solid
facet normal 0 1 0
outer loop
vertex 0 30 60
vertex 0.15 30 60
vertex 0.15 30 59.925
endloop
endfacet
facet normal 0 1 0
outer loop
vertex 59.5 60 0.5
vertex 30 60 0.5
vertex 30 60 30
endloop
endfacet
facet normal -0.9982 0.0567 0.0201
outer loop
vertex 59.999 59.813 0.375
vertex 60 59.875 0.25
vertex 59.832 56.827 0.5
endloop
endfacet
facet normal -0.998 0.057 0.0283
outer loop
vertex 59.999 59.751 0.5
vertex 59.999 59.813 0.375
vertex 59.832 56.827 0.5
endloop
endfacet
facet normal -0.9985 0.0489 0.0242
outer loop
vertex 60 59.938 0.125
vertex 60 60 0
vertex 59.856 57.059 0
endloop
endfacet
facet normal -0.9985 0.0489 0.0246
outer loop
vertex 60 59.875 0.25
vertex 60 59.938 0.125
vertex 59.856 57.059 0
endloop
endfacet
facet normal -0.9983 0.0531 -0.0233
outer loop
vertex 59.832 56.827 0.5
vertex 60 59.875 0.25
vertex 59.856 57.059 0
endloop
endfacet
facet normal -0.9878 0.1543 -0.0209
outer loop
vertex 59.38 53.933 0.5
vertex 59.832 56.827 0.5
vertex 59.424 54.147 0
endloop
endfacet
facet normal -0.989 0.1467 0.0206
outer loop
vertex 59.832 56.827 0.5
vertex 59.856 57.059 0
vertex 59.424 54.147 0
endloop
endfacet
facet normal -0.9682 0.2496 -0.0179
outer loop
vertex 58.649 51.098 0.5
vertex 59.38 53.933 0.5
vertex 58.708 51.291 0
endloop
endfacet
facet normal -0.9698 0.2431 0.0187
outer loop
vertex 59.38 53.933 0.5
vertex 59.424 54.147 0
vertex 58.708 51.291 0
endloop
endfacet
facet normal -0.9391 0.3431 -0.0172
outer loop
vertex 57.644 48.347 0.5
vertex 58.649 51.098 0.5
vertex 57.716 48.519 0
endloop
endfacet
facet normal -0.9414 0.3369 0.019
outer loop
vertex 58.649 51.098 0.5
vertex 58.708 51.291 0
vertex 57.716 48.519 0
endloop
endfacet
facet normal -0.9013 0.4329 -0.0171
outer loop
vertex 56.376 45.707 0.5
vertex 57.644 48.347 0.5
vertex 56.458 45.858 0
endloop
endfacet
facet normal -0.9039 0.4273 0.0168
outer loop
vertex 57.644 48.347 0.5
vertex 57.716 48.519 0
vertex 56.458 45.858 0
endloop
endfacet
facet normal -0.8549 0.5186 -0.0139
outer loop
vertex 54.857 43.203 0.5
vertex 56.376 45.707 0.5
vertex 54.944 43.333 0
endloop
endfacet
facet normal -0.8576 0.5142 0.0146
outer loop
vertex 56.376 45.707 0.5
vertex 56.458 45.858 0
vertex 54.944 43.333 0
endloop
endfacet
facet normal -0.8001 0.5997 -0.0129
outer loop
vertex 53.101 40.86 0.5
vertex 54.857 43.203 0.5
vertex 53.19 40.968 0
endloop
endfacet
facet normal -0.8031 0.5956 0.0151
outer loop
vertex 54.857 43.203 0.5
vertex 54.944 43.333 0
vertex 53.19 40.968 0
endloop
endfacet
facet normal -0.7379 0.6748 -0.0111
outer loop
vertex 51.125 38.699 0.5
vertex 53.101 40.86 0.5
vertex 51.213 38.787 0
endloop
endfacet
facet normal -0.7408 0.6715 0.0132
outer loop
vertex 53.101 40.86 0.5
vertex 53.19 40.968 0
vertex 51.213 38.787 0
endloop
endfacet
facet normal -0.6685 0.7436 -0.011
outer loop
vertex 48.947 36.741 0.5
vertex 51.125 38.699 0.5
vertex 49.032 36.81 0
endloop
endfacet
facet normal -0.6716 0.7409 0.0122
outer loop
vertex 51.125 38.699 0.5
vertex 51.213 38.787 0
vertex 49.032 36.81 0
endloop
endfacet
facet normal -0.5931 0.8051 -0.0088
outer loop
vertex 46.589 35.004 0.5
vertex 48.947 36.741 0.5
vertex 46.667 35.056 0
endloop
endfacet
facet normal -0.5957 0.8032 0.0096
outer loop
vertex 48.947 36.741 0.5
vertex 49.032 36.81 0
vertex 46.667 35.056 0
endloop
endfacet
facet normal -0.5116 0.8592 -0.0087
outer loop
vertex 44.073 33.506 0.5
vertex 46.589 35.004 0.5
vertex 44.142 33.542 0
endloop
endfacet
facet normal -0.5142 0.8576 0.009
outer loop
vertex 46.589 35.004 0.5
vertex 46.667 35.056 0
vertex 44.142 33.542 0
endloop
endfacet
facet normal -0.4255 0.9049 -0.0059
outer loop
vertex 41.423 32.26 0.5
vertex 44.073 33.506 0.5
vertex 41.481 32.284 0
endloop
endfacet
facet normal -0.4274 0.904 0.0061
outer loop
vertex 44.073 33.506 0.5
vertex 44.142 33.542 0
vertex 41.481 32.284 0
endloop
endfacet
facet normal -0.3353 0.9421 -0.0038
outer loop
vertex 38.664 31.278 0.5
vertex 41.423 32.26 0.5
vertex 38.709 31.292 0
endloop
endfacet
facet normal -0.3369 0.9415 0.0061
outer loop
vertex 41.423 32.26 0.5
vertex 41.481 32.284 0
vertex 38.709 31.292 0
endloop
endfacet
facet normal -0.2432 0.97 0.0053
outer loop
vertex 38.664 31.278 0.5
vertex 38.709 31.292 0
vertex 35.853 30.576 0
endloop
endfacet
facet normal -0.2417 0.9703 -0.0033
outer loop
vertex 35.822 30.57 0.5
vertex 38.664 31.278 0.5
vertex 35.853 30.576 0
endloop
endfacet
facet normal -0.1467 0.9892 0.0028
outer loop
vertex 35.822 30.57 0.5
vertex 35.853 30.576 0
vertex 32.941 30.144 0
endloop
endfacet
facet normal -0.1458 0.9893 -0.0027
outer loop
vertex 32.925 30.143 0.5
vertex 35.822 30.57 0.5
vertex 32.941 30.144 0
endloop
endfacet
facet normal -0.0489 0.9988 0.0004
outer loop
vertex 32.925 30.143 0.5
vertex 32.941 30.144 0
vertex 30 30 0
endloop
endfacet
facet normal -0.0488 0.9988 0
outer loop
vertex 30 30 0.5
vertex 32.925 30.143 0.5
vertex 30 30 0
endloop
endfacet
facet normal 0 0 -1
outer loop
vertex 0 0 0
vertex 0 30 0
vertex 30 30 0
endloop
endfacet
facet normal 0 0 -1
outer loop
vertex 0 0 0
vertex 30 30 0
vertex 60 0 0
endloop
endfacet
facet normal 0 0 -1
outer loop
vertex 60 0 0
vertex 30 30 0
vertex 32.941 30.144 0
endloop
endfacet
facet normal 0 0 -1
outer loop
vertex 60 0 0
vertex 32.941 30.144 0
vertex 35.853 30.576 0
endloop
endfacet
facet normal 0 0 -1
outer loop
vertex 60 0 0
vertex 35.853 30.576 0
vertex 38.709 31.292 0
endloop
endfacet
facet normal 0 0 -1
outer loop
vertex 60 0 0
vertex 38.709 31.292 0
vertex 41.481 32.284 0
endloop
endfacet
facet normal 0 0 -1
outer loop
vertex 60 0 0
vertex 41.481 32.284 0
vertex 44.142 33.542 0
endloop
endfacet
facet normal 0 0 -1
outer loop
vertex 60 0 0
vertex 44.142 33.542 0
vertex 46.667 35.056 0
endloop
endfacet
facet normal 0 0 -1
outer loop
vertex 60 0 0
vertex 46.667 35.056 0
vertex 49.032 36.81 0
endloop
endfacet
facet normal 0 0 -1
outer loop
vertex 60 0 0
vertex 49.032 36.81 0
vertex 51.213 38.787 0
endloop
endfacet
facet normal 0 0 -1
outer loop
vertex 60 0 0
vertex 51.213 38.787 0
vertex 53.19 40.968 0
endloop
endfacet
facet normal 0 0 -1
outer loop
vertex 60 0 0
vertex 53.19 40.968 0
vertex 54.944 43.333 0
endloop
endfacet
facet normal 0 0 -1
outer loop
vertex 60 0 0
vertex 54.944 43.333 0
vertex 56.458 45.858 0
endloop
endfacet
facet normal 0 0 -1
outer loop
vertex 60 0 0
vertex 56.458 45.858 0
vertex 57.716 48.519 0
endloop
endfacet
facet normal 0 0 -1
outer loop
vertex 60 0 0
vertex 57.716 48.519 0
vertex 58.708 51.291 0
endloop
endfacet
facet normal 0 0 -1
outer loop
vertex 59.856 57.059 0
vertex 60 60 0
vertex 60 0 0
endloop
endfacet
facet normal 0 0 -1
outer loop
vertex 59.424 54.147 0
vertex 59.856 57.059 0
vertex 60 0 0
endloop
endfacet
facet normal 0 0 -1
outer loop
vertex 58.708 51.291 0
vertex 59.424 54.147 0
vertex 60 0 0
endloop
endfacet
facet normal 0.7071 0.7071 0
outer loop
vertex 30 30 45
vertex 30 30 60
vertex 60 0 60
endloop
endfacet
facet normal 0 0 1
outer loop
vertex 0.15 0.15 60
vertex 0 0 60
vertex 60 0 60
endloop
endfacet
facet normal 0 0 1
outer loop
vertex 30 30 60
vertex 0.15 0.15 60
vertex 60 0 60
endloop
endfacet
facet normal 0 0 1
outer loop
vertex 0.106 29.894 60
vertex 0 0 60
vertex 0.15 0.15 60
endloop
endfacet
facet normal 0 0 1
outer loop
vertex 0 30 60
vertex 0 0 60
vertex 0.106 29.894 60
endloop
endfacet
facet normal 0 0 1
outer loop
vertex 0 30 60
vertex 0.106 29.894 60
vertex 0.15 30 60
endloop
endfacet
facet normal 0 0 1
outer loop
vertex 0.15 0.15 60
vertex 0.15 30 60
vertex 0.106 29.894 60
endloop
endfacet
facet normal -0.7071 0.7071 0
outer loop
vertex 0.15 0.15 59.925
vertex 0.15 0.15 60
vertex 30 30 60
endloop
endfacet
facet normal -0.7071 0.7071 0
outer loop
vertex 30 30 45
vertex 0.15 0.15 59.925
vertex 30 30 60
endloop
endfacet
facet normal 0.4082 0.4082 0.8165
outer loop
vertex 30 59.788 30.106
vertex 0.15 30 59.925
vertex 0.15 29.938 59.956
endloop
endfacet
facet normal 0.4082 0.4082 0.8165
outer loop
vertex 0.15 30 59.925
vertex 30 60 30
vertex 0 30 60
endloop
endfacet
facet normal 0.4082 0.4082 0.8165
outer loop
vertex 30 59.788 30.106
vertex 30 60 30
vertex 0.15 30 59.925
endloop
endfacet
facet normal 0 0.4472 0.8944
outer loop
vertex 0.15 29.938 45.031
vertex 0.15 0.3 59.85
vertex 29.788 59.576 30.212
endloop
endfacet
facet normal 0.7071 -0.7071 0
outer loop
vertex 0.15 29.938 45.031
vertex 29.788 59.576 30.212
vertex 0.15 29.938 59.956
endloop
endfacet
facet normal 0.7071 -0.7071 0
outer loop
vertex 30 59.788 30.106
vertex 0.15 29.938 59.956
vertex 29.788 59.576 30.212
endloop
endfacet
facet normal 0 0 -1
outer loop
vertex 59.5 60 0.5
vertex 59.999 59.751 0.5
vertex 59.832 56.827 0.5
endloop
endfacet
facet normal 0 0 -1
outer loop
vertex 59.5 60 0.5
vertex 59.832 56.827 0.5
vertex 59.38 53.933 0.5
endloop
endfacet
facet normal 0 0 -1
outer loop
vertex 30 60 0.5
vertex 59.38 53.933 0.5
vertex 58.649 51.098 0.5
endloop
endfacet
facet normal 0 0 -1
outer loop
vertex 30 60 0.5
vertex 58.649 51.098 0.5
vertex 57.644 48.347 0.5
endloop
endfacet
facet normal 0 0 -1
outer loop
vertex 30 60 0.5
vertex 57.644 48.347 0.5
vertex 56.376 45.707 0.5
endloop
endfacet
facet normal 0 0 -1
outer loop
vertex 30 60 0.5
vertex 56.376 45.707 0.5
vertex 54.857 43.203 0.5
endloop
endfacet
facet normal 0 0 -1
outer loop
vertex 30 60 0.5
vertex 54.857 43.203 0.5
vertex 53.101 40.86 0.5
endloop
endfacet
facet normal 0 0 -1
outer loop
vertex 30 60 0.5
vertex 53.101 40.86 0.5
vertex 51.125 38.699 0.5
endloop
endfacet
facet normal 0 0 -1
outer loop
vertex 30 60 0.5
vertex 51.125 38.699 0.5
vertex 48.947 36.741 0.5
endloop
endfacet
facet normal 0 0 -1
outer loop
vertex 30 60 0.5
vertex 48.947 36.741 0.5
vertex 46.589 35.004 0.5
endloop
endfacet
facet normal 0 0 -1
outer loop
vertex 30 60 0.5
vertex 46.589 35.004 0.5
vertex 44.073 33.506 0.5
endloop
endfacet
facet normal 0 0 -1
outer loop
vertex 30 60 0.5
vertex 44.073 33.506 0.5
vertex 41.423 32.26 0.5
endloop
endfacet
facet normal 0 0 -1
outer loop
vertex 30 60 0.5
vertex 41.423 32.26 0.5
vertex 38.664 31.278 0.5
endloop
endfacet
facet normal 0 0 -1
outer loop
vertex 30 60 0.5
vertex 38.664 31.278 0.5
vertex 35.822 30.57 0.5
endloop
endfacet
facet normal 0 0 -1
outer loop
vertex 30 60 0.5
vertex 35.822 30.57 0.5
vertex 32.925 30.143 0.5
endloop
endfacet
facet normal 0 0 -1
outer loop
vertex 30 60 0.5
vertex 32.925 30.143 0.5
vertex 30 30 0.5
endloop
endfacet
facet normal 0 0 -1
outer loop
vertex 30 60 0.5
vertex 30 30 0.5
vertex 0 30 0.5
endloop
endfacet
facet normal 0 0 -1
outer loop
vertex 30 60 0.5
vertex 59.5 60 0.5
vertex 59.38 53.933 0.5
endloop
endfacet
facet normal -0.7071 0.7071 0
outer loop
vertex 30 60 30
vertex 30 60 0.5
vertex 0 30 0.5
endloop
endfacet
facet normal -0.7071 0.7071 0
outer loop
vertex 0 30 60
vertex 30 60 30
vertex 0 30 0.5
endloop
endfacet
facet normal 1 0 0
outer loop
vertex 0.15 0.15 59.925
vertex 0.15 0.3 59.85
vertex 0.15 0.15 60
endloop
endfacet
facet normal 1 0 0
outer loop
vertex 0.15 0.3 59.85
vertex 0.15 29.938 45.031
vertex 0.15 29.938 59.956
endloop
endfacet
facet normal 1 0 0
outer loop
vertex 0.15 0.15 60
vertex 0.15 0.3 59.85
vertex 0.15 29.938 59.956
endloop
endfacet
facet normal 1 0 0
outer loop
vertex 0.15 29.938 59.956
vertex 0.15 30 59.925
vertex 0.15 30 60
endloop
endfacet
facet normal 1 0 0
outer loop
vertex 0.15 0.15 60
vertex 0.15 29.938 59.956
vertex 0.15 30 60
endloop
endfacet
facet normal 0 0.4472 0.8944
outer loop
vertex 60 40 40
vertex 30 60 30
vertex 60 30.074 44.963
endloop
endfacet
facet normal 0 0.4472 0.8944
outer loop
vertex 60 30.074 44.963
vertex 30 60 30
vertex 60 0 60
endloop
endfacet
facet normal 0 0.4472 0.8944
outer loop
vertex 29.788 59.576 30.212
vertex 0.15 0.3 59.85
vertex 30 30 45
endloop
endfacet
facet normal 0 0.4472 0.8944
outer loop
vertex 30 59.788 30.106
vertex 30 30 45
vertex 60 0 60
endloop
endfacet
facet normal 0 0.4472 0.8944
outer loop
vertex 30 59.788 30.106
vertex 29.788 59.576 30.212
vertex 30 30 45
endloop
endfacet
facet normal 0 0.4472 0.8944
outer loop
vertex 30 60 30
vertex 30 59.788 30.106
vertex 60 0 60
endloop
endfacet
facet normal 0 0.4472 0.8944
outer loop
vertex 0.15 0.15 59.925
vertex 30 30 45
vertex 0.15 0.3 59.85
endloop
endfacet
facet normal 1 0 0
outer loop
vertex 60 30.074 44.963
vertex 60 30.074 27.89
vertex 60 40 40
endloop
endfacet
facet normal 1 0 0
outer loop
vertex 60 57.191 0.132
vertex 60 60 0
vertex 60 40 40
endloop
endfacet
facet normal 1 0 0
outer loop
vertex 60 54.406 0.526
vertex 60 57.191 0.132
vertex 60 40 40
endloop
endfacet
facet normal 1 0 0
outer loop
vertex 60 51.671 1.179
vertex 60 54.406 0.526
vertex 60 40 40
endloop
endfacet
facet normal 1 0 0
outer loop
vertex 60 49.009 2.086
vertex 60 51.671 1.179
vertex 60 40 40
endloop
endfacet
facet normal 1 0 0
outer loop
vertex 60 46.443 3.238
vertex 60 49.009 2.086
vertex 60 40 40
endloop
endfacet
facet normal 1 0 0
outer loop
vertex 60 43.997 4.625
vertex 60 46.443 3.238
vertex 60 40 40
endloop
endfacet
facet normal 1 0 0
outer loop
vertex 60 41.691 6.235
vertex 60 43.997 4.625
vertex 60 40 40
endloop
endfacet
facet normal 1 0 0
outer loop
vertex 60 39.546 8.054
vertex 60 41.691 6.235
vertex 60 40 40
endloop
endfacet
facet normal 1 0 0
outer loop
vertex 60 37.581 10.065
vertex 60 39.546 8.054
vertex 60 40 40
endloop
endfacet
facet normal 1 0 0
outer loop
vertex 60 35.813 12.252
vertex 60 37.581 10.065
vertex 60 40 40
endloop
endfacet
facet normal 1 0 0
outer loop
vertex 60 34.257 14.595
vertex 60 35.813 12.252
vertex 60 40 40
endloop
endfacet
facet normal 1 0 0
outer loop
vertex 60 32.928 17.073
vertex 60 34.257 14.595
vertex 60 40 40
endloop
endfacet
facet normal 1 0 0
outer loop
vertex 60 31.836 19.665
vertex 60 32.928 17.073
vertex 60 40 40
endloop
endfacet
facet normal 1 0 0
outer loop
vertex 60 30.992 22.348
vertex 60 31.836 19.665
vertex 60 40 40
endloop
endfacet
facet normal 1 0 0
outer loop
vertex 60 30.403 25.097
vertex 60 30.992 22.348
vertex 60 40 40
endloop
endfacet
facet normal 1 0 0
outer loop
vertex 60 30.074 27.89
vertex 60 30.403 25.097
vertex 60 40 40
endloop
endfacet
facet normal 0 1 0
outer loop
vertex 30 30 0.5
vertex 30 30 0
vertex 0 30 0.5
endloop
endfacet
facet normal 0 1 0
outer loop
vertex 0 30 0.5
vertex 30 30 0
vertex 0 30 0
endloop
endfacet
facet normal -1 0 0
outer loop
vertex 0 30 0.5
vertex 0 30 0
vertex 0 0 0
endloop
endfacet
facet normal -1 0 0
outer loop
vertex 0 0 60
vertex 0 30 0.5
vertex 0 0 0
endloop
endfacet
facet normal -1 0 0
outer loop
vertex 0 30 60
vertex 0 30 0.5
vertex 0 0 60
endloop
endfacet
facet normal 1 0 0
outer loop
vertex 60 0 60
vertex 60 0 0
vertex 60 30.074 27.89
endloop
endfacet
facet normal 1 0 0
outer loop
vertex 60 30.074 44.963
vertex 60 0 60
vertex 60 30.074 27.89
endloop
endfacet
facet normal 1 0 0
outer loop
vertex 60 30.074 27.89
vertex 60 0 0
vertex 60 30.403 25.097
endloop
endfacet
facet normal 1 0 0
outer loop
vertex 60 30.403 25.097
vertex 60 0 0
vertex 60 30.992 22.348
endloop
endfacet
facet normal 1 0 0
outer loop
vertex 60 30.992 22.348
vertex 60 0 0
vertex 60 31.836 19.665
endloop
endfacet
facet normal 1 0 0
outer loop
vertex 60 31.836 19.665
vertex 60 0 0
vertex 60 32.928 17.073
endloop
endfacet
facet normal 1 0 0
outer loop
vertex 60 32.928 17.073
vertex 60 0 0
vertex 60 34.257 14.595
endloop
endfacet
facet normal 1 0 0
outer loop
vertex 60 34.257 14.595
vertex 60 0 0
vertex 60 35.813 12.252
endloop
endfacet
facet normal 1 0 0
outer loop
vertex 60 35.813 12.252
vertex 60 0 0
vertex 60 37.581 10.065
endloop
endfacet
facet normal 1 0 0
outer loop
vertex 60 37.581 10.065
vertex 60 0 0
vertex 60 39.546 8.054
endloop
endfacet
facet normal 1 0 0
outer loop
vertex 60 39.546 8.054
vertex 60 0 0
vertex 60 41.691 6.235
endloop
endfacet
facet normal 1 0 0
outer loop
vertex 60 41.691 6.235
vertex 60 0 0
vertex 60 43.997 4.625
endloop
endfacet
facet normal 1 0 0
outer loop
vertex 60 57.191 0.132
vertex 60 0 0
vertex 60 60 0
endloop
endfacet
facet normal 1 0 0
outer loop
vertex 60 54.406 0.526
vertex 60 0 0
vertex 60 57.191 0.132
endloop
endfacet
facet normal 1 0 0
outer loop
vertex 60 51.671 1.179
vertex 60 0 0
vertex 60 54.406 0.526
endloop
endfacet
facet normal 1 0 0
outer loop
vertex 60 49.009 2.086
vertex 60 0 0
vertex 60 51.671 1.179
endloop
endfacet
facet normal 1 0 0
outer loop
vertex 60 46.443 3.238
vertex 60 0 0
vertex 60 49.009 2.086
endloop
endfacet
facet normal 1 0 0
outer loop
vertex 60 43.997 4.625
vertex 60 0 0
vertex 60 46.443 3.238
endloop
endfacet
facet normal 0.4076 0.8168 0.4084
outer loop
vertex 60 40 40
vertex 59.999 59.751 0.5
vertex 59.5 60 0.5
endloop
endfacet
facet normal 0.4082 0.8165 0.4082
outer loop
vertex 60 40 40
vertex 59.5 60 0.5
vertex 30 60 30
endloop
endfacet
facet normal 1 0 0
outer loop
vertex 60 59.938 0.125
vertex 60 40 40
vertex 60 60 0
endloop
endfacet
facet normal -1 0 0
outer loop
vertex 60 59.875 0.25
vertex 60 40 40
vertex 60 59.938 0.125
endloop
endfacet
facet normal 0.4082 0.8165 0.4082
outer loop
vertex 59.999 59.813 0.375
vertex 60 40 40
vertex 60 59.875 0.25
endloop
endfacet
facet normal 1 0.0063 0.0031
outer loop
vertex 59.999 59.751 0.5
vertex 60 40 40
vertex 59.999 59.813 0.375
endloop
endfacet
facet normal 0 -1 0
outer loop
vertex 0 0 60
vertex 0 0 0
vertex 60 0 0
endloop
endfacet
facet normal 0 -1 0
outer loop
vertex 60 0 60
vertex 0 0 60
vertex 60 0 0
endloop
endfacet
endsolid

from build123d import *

# Parameters (mm, degrees)
SKETCH1_W            = 60
SKETCH1_H            = 60
BOSS_EXTRUDE1_DEPTH  = 60
CUT_EXTRUDE1_DEPTH   = 60
CUT_EXTRUDE2_DEPTH   = 60
CUT_EXTRUDE3_DEPTH   = 60
CUT_EXTRUDE4_DEPTH   = 60
CUT_EXTRUDE5_DEPTH   = 60
CUT_EXTRUDE6_DEPTH   = 60
CUT_EXTRUDE7_DEPTH   = 60
CUT_EXTRUDE8_DEPTH   = 60
BOSS_EXTRUDE3_DEPTH  = 60
BOSS_EXTRUDE7_DEPTH  = 0.15
BOSS_EXTRUDE8_DEPTH  = 0.15
CUT_EXTRUDE10_DEPTH  = 0.5
BOSS_EXTRUDE10_DEPTH = 0.0001


with BuildPart() as part:
    # Sketch1 → Boss-Extrude1 (new body)
    with BuildSketch(Plane.XY):
        with Locations((30, 30)):
            Rectangle(SKETCH1_W, SKETCH1_H)
    extrude(amount=BOSS_EXTRUDE1_DEPTH)

    # Sketch2 → Cut-Extrude1 (cut)
    with BuildSketch(Plane.XY.offset(60)):
        Polygon((30, 60), (0, 30), (0, 60), align=None)
    extrude(amount=-CUT_EXTRUDE1_DEPTH, mode=Mode.SUBTRACT)

    # Sketch3 → Cut-Extrude2 (cut)
    with BuildSketch(Plane(origin=(60, 0, 0), x_dir=(0, 0, -1), z_dir=(1, 0, 0))):
        Polygon((-60, 30), (-30, 60), (-60, 60), align=None)
    extrude(amount=-CUT_EXTRUDE2_DEPTH, mode=Mode.SUBTRACT)

    # Sketch4 → Cut-Extrude3 (cut)
    with BuildSketch(Plane(origin=(30, 60, 30), x_dir=(0.912870929, -0.365148372, -0.182574186), z_dir=(0.40824829, 0.816496581, 0.40824829))):
        Polygon((0, 0), (32.86335345, 26.83281573), (32.86335345, -40.249223595), align=None)
    extrude(amount=CUT_EXTRUDE3_DEPTH, mode=Mode.SUBTRACT)

    # Sketch5 → Cut-Extrude4 (cut)
    with BuildSketch(Plane(origin=(0, 24, 48), x_dir=(1, 0, 0), z_dir=(0, 0.447213595, 0.894427191))):
        Polygon((0, -26.83281573), (60, -26.83281573), (30, 40.249223595), align=None)
    extrude(amount=CUT_EXTRUDE4_DEPTH, mode=Mode.SUBTRACT)

    # Sketch6 → Cut-Extrude5 (cut)
    with BuildSketch(Plane(origin=(10, -4, 2), x_dir=(0.169515876, -0.06780635, -0.98319208), z_dir=(0.912870929, -0.365148372, 0.182574186))):
        Polygon((-58.991524815, 32.310988843), (-58.991524815, 0), (-28.478667152, 66.850321744), align=None)
    extrude(amount=-CUT_EXTRUDE5_DEPTH, mode=Mode.SUBTRACT)

    # Sketch7 → Cut-Extrude6 (cut)
    with BuildSketch(Plane(origin=(40, 16, -8), x_dir=(0.169515876, 0.06780635, 0.98319208), z_dir=(-0.912870929, -0.365148372, 0.182574186))):
        Polygon((38.649619706, 44.566881162), (69.162477369, -22.283440581), (69.162477369, 10.027548262), align=None)
    extrude(amount=-CUT_EXTRUDE6_DEPTH, mode=Mode.SUBTRACT)

    # Sketch8 → Cut-Extrude7 (cut)
    with BuildSketch(Plane(origin=(11.724137931, 4.689655172, 68), x_dir=(-0.985527457, 0.011663047, 0.169114179), z_dir=(-0.169515876, -0.06780635, -0.98319208))):
        Polygon((-36.808575777, 25.800784356), (-47.082262149, 27.800345143), (-48.984796662, 27.017107047), (-48.984796662, -4.128125497), align=None)
    extrude(amount=-CUT_EXTRUDE7_DEPTH, mode=Mode.SUBTRACT)

    # Sketch9 → Cut-Extrude8 (cut)
    with BuildSketch(Plane(origin=(-10, 4, 58), x_dir=(-0.985527457, -0.011663047, -0.169114179), z_dir=(0.169515876, -0.06780635, -0.98319208))):
        Polygon((-10.146850737, -4.128125497), (-10.146850737, 25.943133511), (-12.04938525, 27.800345143), (-22.323071622, 25.800784356), align=None)
    extrude(amount=-CUT_EXTRUDE8_DEPTH, mode=Mode.SUBTRACT)

    # Sketch11 → Boss-Extrude3 (add)
    with BuildSketch(Plane.XY.offset(60)):
        Polygon((0, 0), (30, 30), (60, 0), align=None)
    extrude(amount=-BOSS_EXTRUDE3_DEPTH)

    # Sketch12 → Boss-Extrude7 (add)
    with BuildSketch(Plane.ZY):
        Polygon((45, 30), (60, 0), (60, 30), align=None)
    extrude(amount=-BOSS_EXTRUDE7_DEPTH)

    # Sketch13 → Boss-Extrude8 (add)
    with BuildSketch(Plane(origin=(-15, 15, 0), x_dir=(0.707106781, 0.707106781, 0), z_dir=(-0.707106781, 0.707106781, 0))):
        Polygon((63.639610307, -30), (21.213203436, -60), (21.213203436, -45), align=None)
    extrude(amount=-BOSS_EXTRUDE8_DEPTH)

    # Sketch14 → Cut-Extrude10 (cut)
    with BuildSketch(Plane(origin=(0, 0, 0), x_dir=(-1, 0, 0), z_dir=(0, 0, -1))):
        with BuildLine():
            Line((-30, 30), (0, 30))
            Line((0, 30), (-30, 60))
            Line((-30, 60), (-60, 60))
            ThreePointArc((-60, 60), (-51.213203436, 38.786796564), (-30, 30))
        make_face()
    extrude(amount=-CUT_EXTRUDE10_DEPTH, mode=Mode.SUBTRACT)

    # Sketch15 → Boss-Extrude10 (add)
    with BuildSketch(Plane(origin=(60, 0, 0), x_dir=(0, 0, -1), z_dir=(1, 0, 0))):
        with BuildLine():
            Line((-27.89036592, 30.074267861), (-44.962866069, 30.074267861))
            Line((-44.962866069, 30.074267861), (-40, 40))
            Line((-40, 40), (0, 60))
            ThreePointArc((0, 60), (-8.053599129, 39.546259784), (-27.89036592, 30.074267861))
        make_face()
    extrude(amount=BOSS_EXTRUDE10_DEPTH)


solid = part.part
